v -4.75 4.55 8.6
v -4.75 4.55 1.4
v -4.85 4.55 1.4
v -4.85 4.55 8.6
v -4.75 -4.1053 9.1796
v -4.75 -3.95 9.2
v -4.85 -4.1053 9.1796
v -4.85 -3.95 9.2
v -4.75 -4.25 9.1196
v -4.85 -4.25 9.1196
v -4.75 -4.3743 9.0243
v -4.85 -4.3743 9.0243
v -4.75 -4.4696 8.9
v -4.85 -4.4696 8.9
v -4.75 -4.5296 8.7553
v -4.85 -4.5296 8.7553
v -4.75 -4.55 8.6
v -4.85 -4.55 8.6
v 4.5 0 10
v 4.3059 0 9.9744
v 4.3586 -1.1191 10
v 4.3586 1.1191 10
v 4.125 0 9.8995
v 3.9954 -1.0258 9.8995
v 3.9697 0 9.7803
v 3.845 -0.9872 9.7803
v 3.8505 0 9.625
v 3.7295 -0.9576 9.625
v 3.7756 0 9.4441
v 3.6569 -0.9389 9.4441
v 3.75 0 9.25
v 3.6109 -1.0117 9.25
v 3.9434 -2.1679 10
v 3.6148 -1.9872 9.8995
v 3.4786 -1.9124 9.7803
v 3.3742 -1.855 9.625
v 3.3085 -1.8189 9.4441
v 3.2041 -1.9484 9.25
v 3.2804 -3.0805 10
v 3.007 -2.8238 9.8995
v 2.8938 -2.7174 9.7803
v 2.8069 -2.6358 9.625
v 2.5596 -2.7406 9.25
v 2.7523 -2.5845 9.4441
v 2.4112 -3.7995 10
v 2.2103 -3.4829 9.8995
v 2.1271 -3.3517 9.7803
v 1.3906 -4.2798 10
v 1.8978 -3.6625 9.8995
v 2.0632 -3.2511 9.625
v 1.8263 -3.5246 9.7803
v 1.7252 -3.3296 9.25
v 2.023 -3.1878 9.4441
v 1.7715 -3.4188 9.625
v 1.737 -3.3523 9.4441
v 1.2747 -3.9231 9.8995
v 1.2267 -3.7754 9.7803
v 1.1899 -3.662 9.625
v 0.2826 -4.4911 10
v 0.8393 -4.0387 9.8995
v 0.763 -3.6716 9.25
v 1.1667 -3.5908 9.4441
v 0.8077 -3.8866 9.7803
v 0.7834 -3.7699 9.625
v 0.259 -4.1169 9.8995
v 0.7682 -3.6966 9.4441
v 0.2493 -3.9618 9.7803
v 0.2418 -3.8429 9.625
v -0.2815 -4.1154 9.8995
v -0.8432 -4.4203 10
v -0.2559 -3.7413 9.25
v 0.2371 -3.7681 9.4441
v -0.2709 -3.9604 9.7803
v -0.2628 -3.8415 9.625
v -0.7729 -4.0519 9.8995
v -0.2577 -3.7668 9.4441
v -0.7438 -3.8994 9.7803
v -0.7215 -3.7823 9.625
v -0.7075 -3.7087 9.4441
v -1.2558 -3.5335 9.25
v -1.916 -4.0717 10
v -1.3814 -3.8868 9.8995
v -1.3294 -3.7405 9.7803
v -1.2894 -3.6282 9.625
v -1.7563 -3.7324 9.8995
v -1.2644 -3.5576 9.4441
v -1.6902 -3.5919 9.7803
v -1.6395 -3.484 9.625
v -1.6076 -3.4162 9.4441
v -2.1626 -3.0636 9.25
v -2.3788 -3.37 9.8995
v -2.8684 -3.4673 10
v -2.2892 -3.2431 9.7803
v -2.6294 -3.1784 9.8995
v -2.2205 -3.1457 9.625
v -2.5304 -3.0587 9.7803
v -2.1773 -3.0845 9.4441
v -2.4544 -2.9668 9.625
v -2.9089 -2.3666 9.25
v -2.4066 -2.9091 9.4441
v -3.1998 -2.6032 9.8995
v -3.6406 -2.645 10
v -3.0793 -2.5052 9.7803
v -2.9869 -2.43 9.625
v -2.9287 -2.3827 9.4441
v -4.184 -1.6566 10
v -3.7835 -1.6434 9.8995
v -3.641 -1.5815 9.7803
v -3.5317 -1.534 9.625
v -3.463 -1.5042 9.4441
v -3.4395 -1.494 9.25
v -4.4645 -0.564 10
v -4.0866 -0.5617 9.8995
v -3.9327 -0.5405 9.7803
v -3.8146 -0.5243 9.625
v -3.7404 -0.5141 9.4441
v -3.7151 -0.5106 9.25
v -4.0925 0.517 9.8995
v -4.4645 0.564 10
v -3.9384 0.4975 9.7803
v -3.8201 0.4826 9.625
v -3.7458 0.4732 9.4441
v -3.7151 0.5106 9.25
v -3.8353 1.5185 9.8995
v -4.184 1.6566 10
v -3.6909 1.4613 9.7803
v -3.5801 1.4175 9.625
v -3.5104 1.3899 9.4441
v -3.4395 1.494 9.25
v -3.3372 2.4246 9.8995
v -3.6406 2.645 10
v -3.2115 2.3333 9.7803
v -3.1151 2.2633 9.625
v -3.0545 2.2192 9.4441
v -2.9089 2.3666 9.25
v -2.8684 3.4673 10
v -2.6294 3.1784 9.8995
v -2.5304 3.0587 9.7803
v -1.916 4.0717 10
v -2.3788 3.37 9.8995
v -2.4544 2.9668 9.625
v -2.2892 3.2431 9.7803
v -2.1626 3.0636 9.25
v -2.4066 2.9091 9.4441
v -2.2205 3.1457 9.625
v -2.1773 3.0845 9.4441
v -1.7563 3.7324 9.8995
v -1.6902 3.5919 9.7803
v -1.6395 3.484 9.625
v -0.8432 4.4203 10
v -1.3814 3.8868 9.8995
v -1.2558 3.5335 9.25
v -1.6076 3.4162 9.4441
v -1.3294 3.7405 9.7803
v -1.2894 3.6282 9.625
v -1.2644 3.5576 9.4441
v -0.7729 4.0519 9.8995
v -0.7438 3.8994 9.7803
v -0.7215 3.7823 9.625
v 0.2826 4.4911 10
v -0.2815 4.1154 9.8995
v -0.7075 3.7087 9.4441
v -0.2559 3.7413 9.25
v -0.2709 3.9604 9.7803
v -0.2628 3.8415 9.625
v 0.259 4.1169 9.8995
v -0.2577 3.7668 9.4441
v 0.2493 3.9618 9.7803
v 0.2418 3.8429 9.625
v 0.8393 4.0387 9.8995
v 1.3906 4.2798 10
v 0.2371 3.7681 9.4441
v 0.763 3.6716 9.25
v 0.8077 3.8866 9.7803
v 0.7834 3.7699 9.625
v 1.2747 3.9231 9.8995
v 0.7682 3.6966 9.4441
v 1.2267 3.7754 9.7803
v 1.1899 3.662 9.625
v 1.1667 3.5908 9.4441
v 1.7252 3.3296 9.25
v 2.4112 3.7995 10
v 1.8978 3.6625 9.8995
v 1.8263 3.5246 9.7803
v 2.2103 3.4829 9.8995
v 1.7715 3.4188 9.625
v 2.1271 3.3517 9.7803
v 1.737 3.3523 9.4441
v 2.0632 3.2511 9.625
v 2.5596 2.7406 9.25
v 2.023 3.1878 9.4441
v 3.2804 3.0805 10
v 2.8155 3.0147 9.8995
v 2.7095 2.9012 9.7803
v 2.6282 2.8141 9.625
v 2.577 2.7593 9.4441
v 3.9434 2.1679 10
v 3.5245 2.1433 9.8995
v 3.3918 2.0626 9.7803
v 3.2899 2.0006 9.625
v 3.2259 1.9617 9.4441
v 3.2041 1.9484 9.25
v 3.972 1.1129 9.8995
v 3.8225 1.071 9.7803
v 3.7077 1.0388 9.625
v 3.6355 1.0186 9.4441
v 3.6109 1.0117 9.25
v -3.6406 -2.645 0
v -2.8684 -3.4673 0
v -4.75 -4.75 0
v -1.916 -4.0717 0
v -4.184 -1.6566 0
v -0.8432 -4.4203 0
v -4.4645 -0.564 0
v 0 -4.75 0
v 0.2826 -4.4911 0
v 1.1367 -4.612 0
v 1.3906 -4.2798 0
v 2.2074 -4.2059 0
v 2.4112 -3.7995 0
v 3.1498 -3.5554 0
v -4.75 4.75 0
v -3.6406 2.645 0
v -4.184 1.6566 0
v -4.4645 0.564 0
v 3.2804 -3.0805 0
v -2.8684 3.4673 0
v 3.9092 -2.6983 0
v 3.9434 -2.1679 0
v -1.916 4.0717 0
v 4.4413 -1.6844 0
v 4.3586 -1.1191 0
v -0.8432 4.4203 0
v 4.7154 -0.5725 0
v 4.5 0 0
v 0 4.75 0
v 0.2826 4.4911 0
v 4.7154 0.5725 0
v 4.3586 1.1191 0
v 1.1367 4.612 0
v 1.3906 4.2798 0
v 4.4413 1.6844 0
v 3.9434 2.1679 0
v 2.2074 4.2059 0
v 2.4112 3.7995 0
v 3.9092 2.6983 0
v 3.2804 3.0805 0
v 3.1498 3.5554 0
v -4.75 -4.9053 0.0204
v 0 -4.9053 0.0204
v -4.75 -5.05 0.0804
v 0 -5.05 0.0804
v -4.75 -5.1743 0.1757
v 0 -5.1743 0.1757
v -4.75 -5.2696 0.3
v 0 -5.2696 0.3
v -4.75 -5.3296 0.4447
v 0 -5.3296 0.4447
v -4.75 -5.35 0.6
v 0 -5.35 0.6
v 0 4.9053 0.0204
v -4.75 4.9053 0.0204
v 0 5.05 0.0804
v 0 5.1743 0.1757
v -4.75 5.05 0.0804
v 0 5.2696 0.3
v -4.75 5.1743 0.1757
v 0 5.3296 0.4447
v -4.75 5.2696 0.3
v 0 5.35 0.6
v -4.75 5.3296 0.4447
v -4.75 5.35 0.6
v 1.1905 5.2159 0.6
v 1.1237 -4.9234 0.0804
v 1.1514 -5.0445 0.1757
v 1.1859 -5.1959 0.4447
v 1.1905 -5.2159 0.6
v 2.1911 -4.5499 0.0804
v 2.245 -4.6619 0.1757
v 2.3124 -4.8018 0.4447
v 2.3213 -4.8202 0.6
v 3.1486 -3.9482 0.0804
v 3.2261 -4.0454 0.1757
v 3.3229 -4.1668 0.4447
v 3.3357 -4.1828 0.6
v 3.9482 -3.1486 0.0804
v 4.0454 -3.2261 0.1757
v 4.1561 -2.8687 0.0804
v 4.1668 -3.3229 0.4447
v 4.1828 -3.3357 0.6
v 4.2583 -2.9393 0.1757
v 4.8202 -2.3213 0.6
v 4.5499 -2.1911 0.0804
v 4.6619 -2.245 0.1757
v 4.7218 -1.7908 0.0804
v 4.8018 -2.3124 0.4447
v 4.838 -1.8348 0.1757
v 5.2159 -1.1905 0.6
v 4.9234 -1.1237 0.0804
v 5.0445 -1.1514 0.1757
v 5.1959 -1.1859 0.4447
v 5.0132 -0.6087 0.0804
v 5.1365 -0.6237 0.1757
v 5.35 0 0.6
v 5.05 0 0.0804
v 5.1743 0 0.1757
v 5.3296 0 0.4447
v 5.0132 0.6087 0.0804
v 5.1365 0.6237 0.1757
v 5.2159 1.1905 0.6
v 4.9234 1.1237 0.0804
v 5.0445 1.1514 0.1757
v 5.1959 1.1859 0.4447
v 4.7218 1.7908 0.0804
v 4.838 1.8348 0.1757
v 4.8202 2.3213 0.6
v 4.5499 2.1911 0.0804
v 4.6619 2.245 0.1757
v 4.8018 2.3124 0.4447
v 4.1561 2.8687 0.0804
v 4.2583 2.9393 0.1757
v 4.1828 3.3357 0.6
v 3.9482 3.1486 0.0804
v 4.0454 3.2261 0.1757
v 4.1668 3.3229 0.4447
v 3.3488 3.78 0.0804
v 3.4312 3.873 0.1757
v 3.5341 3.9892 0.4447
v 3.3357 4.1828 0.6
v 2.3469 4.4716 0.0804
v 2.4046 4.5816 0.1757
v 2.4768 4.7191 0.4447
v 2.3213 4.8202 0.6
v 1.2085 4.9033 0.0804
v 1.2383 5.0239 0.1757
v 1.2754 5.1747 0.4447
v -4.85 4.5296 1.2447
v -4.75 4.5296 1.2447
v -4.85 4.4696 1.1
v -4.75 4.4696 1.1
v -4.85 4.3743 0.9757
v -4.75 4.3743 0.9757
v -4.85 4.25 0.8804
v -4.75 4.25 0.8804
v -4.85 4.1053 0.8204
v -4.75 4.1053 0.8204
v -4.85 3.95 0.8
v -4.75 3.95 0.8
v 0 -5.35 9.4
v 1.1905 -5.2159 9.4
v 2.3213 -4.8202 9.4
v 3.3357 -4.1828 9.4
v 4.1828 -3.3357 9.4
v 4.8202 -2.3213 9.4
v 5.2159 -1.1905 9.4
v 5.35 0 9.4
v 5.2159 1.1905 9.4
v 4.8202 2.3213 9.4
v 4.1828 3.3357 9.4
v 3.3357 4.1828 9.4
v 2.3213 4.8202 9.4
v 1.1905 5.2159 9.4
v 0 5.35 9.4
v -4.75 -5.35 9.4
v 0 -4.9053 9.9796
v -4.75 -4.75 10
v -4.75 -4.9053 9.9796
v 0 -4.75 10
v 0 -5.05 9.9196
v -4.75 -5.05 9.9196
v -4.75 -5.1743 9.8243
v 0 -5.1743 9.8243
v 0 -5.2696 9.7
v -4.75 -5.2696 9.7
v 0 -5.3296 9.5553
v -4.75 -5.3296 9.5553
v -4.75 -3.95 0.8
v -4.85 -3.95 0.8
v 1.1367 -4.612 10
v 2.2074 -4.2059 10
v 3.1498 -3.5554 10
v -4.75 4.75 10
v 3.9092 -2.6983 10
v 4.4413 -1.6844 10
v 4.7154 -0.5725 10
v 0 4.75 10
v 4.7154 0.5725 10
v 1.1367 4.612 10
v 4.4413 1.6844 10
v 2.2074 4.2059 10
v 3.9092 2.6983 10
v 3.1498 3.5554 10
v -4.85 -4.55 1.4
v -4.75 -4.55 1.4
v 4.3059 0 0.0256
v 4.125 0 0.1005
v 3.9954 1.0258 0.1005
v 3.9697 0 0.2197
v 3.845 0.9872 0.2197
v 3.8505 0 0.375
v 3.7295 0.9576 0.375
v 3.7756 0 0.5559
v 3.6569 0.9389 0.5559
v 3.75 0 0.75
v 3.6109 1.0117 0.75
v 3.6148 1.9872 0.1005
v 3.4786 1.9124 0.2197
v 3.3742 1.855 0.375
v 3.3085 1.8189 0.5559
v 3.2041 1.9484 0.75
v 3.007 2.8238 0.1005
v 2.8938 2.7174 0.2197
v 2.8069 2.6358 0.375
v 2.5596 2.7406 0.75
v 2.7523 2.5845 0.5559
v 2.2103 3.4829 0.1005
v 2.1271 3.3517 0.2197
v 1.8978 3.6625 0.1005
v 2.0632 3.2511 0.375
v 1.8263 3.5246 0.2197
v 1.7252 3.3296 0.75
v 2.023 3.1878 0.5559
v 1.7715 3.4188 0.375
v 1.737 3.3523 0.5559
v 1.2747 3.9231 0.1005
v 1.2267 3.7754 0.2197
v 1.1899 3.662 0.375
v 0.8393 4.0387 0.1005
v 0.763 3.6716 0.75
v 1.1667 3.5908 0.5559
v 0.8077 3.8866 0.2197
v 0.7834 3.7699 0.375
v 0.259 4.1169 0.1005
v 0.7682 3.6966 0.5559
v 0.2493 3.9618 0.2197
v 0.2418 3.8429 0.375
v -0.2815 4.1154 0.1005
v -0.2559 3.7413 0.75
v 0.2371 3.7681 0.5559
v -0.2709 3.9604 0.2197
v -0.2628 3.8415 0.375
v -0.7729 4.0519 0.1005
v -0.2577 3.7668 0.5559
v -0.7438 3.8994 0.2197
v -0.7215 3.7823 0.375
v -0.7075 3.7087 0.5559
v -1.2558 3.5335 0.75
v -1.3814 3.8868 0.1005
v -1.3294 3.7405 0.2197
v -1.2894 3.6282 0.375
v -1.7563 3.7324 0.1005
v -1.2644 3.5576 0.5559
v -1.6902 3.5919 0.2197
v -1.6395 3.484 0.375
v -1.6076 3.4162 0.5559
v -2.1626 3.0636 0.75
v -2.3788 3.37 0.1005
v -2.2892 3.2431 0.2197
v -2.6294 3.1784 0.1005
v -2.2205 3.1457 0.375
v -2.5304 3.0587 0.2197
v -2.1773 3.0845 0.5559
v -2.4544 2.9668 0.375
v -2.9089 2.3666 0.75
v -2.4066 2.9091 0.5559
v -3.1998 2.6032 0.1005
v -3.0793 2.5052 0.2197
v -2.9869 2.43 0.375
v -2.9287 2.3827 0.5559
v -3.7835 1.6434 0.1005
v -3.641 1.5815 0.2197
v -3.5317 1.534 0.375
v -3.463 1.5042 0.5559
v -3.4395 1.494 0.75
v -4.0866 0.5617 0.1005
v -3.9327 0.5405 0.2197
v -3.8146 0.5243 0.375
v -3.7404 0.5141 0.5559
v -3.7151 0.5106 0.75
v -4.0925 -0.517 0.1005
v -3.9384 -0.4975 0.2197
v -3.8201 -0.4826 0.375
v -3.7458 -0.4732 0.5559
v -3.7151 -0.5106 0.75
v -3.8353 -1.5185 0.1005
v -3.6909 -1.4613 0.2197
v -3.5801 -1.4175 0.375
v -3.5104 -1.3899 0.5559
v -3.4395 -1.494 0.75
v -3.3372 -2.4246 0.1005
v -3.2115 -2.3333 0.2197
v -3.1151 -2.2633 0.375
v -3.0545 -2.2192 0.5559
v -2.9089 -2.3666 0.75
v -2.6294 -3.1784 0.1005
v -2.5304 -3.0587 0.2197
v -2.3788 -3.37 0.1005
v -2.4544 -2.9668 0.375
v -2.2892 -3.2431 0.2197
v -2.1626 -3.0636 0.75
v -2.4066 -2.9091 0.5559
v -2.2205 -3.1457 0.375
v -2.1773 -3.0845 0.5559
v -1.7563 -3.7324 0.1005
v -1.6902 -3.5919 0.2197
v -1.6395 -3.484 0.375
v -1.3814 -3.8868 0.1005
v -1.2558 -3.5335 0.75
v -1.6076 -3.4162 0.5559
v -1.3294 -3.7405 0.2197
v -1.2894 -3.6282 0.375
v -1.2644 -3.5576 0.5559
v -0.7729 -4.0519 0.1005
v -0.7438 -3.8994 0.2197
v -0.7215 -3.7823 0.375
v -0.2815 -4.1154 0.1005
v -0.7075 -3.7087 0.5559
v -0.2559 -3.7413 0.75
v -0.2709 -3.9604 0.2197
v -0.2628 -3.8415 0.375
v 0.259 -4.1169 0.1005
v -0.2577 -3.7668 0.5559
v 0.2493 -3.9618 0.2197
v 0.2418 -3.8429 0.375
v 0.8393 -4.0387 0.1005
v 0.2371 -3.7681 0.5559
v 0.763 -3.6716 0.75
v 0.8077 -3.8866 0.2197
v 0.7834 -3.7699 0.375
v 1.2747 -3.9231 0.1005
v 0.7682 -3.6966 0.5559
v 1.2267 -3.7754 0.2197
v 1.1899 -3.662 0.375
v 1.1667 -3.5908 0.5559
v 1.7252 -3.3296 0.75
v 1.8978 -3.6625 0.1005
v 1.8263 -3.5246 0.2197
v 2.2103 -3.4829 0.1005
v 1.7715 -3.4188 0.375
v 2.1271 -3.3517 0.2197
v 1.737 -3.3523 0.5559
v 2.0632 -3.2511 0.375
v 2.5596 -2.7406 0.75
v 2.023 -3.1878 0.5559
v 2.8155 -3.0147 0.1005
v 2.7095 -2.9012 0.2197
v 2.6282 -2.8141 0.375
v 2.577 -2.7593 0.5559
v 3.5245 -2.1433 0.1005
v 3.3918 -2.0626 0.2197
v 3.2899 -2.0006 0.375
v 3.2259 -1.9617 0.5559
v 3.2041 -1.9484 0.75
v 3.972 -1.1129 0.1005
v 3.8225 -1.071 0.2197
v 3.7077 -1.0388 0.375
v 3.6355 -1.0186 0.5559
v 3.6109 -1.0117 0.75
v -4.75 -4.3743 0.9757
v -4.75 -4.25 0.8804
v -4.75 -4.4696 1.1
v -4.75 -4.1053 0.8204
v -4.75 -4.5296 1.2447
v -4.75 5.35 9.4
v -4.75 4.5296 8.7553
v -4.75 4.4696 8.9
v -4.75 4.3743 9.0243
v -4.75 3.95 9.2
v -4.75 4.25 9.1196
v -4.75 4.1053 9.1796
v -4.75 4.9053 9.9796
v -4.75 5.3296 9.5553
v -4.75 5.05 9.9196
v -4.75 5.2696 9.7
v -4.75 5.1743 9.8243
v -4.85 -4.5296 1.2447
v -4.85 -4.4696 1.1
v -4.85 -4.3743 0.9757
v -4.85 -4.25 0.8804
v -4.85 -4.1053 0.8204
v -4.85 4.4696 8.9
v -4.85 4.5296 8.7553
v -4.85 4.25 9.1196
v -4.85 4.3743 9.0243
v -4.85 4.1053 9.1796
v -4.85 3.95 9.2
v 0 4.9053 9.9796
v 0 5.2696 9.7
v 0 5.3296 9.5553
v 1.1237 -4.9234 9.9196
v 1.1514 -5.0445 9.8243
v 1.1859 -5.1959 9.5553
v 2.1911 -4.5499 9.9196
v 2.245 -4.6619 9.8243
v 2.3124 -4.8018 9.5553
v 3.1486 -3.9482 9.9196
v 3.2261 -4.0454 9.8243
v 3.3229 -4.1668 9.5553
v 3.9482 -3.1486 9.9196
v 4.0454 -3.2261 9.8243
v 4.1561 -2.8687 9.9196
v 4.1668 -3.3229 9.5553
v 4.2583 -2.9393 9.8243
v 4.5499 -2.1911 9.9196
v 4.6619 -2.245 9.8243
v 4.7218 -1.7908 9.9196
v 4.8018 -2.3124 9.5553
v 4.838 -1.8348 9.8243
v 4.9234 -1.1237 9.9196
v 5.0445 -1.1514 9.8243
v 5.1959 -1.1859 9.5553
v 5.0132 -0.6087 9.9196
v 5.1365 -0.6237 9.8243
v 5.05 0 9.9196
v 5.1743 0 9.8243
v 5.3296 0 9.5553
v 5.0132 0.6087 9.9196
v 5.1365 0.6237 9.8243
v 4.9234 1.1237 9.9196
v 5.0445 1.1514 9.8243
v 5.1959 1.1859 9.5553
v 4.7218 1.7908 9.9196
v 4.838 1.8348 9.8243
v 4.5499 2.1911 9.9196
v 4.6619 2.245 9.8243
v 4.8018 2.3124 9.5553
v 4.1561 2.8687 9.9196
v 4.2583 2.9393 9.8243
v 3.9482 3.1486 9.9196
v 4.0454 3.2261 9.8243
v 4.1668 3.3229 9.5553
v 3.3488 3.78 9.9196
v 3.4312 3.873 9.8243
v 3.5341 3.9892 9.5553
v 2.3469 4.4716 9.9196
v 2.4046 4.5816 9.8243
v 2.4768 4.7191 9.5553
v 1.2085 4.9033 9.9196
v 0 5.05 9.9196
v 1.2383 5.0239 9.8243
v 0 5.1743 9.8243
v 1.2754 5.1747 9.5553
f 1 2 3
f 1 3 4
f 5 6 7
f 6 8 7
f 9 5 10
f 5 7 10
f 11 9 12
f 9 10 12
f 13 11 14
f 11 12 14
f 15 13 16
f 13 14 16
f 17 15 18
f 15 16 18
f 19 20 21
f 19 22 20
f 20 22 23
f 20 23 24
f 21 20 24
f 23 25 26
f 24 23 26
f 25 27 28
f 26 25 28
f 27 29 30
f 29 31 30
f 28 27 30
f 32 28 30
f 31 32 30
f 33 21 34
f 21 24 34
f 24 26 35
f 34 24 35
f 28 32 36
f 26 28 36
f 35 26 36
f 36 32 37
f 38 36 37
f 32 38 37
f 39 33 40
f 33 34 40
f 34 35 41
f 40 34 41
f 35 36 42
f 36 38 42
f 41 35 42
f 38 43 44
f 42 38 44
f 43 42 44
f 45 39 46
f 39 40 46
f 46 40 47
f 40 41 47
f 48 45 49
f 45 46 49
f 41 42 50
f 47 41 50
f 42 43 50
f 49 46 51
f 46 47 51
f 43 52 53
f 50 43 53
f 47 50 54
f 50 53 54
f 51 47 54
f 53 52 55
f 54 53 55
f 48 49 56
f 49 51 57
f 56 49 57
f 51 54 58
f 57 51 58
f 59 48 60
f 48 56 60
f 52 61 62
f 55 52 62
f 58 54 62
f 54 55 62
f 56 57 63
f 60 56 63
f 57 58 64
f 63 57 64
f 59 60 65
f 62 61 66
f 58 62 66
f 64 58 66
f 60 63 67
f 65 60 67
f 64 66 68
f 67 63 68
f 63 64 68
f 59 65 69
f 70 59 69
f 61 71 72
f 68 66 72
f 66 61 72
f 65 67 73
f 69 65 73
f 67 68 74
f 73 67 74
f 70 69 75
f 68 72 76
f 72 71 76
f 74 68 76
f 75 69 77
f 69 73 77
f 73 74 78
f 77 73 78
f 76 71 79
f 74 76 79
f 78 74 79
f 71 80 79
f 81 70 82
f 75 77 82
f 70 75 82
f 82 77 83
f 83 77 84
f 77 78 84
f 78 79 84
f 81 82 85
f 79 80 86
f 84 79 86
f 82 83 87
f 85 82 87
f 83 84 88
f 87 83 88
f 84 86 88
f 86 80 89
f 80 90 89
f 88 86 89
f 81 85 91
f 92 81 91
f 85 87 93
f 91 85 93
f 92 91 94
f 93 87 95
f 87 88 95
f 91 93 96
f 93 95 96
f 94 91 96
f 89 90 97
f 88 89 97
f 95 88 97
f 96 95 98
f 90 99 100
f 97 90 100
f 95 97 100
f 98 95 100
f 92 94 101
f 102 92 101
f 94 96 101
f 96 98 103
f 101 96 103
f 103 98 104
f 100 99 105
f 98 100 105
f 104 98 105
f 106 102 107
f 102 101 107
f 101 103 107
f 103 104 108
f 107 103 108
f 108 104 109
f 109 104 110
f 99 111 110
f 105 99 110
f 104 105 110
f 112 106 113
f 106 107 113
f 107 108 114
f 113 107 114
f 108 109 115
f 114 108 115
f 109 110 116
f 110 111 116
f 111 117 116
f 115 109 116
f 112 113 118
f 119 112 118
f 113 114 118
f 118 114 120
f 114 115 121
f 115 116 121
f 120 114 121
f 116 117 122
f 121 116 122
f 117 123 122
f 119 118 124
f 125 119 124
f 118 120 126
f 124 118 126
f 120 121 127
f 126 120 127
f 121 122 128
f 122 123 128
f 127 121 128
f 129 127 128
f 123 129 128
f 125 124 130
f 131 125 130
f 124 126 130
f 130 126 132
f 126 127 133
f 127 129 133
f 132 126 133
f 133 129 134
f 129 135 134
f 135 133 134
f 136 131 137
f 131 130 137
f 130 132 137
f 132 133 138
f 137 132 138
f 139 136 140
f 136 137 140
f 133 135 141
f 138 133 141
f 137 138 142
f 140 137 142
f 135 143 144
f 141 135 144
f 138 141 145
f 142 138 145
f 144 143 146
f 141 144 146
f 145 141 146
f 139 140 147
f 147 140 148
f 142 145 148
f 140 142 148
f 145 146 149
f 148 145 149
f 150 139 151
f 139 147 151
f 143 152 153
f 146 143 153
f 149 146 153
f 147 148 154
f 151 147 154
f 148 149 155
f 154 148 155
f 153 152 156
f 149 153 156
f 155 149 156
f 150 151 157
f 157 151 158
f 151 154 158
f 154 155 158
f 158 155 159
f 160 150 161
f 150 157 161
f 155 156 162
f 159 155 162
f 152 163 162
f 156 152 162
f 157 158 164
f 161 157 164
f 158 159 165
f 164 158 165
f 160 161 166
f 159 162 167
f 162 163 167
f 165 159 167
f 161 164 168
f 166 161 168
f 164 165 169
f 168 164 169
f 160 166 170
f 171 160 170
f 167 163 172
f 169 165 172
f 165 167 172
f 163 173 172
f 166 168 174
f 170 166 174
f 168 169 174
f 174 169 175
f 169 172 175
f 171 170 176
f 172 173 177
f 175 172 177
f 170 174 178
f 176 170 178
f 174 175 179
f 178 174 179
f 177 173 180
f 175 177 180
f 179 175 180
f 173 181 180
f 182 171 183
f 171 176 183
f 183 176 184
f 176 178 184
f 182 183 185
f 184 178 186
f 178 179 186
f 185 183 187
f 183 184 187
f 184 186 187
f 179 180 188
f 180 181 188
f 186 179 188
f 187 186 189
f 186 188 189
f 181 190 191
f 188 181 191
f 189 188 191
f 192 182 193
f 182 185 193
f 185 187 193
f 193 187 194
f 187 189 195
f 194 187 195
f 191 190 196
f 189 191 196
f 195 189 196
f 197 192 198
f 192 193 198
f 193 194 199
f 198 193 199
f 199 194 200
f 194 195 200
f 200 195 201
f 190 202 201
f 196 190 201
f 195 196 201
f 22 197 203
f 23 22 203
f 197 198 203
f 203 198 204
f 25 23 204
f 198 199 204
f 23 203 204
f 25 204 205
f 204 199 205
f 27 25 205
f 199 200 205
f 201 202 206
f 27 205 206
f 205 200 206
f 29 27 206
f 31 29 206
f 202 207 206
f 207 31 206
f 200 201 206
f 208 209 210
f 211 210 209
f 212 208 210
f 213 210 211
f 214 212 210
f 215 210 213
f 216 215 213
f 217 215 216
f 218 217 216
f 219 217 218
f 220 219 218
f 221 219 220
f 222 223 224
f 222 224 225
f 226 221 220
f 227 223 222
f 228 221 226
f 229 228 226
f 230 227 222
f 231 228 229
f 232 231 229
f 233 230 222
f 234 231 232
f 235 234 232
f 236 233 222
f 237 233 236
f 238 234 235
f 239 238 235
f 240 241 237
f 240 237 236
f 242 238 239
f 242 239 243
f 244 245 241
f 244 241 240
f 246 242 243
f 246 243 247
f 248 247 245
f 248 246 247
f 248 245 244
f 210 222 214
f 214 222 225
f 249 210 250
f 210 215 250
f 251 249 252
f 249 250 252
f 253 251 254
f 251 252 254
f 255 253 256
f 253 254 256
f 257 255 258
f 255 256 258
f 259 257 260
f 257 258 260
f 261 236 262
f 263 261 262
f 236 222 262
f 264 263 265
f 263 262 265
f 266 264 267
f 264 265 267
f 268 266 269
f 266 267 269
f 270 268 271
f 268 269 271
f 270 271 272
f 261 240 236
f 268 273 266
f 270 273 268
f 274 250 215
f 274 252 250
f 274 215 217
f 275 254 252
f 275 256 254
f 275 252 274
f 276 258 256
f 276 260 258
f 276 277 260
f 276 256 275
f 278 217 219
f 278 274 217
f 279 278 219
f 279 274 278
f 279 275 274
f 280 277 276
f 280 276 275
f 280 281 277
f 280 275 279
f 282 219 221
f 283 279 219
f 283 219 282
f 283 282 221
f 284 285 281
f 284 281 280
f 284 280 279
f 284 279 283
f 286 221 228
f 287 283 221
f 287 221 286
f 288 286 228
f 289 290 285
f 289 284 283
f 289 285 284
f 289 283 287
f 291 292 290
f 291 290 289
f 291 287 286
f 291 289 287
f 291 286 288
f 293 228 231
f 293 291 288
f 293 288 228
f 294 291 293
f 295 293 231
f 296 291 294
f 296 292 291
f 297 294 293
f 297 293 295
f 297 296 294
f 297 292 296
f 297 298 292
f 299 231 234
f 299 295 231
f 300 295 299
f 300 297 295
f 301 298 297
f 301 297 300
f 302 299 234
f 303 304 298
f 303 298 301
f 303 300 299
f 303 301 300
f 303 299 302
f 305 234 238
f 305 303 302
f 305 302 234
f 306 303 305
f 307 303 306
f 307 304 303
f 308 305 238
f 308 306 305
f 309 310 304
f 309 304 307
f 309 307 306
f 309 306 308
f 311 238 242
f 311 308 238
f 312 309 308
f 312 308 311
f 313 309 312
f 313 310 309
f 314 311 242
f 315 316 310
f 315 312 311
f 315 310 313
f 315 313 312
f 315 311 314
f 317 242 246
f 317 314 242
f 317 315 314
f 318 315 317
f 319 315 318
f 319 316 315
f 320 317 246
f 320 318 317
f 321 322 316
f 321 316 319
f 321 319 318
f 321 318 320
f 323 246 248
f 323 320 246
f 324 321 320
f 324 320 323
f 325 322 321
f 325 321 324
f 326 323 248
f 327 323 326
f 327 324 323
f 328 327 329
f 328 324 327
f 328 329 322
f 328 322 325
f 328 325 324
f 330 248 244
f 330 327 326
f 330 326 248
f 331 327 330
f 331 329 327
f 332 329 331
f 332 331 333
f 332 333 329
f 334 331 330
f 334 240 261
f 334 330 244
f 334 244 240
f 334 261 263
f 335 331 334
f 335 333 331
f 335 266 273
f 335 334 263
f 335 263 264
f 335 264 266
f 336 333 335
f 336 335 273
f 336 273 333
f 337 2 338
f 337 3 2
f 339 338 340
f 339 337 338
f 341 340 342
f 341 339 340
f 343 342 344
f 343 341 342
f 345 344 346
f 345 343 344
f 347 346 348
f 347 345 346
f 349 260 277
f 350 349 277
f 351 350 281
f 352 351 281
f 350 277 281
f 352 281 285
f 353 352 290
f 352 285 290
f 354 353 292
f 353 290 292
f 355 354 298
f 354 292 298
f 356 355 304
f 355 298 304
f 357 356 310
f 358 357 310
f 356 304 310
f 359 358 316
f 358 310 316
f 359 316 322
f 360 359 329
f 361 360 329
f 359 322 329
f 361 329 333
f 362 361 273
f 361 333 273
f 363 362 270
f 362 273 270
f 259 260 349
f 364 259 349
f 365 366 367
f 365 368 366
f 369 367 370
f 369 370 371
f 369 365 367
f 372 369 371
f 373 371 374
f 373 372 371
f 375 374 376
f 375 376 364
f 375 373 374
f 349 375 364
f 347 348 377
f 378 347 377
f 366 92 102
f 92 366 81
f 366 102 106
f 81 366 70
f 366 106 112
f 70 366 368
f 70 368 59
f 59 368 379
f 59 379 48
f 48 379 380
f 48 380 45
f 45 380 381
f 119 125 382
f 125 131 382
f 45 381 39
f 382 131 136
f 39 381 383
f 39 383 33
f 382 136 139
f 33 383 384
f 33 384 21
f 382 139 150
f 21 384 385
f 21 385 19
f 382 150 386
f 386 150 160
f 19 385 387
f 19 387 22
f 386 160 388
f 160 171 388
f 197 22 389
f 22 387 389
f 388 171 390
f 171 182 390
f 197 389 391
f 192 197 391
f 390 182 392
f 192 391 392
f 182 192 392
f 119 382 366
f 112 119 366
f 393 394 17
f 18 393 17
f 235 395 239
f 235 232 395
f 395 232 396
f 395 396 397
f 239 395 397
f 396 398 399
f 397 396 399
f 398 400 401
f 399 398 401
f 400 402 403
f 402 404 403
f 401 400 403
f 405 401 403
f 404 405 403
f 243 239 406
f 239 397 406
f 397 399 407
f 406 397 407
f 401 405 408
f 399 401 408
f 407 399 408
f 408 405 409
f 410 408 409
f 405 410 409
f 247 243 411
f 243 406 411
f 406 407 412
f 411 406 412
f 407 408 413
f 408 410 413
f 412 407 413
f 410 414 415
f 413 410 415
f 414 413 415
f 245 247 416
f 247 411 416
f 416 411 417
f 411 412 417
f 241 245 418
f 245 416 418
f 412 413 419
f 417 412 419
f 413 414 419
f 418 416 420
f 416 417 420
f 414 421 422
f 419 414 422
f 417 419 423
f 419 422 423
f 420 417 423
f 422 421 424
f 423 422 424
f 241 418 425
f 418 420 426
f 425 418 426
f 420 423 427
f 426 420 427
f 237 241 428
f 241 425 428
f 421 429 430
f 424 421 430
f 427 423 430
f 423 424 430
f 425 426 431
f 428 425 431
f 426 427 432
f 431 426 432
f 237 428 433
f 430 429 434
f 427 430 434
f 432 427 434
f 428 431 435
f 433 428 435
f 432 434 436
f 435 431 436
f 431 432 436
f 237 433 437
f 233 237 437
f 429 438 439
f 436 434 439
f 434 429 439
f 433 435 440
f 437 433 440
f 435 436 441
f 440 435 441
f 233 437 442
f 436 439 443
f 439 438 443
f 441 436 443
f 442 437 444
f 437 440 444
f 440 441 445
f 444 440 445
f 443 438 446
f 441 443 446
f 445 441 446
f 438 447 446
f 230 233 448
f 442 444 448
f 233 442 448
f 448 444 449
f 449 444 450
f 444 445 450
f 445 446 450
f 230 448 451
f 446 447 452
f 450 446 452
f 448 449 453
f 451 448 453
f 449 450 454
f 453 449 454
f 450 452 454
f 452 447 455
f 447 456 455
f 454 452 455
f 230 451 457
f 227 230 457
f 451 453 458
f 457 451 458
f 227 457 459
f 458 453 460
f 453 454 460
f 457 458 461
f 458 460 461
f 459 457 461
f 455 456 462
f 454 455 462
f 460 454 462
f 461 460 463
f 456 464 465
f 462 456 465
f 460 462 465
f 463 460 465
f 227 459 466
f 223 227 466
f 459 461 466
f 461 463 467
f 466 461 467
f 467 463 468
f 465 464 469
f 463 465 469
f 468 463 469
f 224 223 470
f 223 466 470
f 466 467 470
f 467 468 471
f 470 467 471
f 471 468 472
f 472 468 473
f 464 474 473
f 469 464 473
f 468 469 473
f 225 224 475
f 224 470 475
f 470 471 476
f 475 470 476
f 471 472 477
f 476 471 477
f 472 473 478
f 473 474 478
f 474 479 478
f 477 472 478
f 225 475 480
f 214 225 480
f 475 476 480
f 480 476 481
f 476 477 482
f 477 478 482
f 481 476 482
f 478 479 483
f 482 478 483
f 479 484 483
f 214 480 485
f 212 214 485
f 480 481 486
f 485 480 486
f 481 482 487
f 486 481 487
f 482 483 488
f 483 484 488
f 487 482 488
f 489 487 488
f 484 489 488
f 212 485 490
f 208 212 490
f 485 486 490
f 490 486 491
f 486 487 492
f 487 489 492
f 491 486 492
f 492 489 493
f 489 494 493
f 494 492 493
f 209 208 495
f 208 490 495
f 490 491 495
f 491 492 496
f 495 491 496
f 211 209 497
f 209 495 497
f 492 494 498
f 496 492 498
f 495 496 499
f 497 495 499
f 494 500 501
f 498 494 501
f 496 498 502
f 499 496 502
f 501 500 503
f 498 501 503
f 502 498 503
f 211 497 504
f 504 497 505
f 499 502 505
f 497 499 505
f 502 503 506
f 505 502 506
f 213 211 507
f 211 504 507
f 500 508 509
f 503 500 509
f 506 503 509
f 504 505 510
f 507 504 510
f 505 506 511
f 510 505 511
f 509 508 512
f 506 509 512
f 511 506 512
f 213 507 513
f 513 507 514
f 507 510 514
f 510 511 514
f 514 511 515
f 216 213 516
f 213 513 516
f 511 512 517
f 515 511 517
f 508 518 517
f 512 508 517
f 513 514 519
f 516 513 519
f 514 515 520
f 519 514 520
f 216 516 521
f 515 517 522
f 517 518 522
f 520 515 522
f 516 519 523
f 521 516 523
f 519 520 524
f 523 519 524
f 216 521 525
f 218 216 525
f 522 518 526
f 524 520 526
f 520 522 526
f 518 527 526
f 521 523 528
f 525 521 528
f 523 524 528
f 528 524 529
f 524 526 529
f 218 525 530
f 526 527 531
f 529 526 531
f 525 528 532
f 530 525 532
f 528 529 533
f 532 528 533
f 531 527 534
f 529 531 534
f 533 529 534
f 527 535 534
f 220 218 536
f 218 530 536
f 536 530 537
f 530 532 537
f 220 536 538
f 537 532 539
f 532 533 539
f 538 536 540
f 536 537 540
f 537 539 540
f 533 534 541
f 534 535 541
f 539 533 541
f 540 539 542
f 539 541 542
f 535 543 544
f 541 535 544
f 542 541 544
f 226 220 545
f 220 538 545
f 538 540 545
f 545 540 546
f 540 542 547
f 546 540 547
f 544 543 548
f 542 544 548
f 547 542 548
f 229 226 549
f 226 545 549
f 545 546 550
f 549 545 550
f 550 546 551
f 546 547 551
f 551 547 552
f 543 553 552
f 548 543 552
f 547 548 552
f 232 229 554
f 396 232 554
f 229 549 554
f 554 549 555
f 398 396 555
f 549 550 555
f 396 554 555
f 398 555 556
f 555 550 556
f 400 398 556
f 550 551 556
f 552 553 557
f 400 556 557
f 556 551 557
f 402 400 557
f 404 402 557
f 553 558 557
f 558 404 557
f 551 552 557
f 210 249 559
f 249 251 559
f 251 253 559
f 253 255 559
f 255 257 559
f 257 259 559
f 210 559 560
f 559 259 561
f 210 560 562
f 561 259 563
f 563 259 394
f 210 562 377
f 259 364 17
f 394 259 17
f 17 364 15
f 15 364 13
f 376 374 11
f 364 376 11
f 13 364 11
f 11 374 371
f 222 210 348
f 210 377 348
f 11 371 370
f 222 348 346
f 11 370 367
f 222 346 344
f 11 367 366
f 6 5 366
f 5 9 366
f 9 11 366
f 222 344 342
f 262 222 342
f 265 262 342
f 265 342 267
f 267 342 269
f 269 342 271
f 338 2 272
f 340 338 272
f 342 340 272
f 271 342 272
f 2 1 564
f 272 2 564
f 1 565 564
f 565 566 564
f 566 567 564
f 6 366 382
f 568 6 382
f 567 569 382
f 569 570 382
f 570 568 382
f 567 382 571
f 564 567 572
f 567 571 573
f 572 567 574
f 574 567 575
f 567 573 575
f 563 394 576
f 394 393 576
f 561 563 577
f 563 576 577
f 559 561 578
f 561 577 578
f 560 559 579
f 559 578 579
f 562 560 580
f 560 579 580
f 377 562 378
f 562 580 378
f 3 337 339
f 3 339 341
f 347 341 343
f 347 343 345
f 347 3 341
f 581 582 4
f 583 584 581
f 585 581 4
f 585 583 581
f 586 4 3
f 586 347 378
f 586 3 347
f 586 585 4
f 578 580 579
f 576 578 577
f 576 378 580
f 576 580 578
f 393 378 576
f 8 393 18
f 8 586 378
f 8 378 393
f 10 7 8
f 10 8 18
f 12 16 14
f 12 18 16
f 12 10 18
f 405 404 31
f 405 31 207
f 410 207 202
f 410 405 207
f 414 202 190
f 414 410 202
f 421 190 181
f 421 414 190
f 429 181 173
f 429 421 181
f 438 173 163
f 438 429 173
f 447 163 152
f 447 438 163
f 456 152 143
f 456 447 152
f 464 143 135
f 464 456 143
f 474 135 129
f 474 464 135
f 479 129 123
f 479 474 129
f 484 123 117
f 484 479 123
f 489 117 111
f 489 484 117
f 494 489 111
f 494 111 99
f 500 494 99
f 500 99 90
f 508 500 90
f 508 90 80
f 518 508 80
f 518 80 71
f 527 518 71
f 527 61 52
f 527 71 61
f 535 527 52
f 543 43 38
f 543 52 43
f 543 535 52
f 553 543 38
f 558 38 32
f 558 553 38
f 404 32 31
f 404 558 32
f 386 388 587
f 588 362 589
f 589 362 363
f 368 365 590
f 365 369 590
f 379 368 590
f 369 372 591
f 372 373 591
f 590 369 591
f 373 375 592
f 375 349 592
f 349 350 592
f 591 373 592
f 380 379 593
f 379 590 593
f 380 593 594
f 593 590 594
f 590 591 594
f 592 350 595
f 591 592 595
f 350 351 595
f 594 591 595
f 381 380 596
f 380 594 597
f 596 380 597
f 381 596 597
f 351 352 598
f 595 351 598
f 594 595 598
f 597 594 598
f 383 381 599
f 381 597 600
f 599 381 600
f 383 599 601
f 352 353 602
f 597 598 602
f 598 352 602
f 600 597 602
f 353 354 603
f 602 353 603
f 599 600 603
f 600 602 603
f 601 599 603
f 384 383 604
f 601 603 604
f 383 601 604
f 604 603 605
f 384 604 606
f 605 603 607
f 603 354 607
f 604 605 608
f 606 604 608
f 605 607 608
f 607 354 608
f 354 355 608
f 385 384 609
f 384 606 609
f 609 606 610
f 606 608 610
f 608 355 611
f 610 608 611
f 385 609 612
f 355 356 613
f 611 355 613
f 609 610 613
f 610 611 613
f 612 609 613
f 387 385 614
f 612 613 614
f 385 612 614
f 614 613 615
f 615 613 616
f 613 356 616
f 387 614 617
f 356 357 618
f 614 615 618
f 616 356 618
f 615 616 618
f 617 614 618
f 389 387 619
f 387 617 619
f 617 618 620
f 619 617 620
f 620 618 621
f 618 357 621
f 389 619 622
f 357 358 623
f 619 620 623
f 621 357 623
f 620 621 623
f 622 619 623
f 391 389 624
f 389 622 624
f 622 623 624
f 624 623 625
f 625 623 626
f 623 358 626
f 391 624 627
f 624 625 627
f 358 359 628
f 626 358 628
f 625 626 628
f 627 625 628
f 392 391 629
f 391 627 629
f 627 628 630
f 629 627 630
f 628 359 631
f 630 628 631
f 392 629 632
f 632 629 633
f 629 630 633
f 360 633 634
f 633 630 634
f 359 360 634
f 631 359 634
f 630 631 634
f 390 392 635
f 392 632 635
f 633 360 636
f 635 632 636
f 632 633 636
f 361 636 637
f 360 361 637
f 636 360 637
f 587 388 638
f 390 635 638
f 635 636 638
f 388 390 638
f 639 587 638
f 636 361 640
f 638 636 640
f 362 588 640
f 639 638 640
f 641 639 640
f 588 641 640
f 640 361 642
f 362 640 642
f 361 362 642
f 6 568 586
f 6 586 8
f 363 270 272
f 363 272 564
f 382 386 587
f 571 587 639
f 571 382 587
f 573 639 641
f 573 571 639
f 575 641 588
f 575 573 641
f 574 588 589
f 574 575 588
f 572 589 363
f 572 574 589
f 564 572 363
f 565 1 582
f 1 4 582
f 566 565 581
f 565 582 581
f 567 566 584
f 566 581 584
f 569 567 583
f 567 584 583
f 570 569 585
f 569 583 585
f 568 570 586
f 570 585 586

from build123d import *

# Parameters (mm, degrees)
F0_R     = 5.35
F0_R_2   = 3.75
F1_DEPTH = 10
F2_W     = 10.7
F2_H     = 10
F3_DEPTH = 4.75
F4_W     = 7.811706725
F4_H     = 10
F5_DEPTH = 25
F6_DEPTH = 25
F7_W     = 9.1
F7_H     = 8.4
F8_DEPTH = 0.1
F9_R     = 0.6
F10_R    = 0.75


with BuildPart() as f1:
    # F0 (on Top) → F1 (new body)
    with BuildSketch(Plane.XY):
        Circle(F0_R)
        Circle(F0_R_2, mode=Mode.SUBTRACT)
        Circle(F0_R_2)
    extrude(amount=F1_DEPTH)

    # F2 (on Right) → F3 (join)
    with BuildSketch(Plane.YZ):
        with Locations((0, 5)):
            Rectangle(F2_W, F2_H)
    extrude(amount=-F3_DEPTH)

    # F4 (on face) → F5 (cut)
    with BuildSketch(Plane(origin=(-4.75, 0, 0), x_dir=(0, -1, 0), z_dir=(-1, 0, 0))):
        with Locations((1.4441466375, 5)):
            Rectangle(F4_W, F4_H)
    extrude(amount=F5_DEPTH, mode=Mode.SUBTRACT)

    # F0 (on Top) → F6 (cut)
    with BuildSketch(Plane.XY):
        Circle(F0_R_2)
    extrude(amount=F6_DEPTH, mode=Mode.SUBTRACT)

    # F7 (on face) → F8 (join)
    with BuildSketch(Plane(origin=(-4.75, 0, 0), x_dir=(0, -1, 0), z_dir=(-1, 0, 0))):
        with Locations((0, 5)):
            Rectangle(F7_W, F7_H)
    extrude(amount=F8_DEPTH)

    # F9
    f9_edges = [f1.edges().sort_by_distance(p)[0] for p in [
        (-2.375, 5.35, 10),
        (-2.375, 5.35, 0),
        (-2.375, -5.35, 0),
        (-2.375, -5.35, 10),
        (-4.8, 4.55, 9.2),
        (-4.8, -4.55, 9.2),
        (-4.8, -4.55, 0.8),
        (-4.8, 4.55, 0.8),
    ]]
    fillet(f9_edges, radius=F9_R)

    # F10
    f10_edges = [f1.edges().sort_by_distance(p)[0] for p in [
        (-3.75, 0, 0),
        (-3.75, 0, 10),
    ]]
    fillet(f10_edges, radius=F10_R)


solid = f1.part
